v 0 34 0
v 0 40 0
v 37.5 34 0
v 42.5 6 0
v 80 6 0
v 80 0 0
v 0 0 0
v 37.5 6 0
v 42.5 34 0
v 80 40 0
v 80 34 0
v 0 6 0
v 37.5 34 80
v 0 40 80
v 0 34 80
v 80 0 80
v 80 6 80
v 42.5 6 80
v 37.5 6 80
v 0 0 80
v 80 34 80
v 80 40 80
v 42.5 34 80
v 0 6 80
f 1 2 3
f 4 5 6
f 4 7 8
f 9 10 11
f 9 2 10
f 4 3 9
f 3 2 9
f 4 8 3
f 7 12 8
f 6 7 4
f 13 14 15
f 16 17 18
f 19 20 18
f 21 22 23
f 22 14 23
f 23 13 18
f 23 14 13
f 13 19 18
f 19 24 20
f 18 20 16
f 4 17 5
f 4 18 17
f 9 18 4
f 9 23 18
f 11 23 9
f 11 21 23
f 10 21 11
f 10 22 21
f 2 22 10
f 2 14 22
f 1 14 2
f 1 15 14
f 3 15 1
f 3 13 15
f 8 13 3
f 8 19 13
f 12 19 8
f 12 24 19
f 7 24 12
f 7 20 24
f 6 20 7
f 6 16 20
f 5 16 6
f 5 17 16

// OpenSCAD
$fn = 32;

// ----------------------------------------------------------------------
// Structural section: ibeam 80 x 40 mm
// ----------------------------------------------------------------------

// --- parameters (mm) ---
sec_w = 80;               // section width, X
sec_h = 40;               // section height, Y
flange_t = 6;             // flange thickness
web_t = 5;                // web thickness
plate_t = 80;             // cut length, Z (extrusion height)

profile = [[0, 0], [80, 0], [80, 6], [42.5, 6], [42.5, 34], [80, 34], [80, 40], [0, 40], [0, 34], [37.5, 34], [37.5, 6], [0, 6]];  // primary outline, 12 points, counter clockwise

// --- the one profile operation ---
linear_extrude(height = plate_t) polygon(points = profile);
